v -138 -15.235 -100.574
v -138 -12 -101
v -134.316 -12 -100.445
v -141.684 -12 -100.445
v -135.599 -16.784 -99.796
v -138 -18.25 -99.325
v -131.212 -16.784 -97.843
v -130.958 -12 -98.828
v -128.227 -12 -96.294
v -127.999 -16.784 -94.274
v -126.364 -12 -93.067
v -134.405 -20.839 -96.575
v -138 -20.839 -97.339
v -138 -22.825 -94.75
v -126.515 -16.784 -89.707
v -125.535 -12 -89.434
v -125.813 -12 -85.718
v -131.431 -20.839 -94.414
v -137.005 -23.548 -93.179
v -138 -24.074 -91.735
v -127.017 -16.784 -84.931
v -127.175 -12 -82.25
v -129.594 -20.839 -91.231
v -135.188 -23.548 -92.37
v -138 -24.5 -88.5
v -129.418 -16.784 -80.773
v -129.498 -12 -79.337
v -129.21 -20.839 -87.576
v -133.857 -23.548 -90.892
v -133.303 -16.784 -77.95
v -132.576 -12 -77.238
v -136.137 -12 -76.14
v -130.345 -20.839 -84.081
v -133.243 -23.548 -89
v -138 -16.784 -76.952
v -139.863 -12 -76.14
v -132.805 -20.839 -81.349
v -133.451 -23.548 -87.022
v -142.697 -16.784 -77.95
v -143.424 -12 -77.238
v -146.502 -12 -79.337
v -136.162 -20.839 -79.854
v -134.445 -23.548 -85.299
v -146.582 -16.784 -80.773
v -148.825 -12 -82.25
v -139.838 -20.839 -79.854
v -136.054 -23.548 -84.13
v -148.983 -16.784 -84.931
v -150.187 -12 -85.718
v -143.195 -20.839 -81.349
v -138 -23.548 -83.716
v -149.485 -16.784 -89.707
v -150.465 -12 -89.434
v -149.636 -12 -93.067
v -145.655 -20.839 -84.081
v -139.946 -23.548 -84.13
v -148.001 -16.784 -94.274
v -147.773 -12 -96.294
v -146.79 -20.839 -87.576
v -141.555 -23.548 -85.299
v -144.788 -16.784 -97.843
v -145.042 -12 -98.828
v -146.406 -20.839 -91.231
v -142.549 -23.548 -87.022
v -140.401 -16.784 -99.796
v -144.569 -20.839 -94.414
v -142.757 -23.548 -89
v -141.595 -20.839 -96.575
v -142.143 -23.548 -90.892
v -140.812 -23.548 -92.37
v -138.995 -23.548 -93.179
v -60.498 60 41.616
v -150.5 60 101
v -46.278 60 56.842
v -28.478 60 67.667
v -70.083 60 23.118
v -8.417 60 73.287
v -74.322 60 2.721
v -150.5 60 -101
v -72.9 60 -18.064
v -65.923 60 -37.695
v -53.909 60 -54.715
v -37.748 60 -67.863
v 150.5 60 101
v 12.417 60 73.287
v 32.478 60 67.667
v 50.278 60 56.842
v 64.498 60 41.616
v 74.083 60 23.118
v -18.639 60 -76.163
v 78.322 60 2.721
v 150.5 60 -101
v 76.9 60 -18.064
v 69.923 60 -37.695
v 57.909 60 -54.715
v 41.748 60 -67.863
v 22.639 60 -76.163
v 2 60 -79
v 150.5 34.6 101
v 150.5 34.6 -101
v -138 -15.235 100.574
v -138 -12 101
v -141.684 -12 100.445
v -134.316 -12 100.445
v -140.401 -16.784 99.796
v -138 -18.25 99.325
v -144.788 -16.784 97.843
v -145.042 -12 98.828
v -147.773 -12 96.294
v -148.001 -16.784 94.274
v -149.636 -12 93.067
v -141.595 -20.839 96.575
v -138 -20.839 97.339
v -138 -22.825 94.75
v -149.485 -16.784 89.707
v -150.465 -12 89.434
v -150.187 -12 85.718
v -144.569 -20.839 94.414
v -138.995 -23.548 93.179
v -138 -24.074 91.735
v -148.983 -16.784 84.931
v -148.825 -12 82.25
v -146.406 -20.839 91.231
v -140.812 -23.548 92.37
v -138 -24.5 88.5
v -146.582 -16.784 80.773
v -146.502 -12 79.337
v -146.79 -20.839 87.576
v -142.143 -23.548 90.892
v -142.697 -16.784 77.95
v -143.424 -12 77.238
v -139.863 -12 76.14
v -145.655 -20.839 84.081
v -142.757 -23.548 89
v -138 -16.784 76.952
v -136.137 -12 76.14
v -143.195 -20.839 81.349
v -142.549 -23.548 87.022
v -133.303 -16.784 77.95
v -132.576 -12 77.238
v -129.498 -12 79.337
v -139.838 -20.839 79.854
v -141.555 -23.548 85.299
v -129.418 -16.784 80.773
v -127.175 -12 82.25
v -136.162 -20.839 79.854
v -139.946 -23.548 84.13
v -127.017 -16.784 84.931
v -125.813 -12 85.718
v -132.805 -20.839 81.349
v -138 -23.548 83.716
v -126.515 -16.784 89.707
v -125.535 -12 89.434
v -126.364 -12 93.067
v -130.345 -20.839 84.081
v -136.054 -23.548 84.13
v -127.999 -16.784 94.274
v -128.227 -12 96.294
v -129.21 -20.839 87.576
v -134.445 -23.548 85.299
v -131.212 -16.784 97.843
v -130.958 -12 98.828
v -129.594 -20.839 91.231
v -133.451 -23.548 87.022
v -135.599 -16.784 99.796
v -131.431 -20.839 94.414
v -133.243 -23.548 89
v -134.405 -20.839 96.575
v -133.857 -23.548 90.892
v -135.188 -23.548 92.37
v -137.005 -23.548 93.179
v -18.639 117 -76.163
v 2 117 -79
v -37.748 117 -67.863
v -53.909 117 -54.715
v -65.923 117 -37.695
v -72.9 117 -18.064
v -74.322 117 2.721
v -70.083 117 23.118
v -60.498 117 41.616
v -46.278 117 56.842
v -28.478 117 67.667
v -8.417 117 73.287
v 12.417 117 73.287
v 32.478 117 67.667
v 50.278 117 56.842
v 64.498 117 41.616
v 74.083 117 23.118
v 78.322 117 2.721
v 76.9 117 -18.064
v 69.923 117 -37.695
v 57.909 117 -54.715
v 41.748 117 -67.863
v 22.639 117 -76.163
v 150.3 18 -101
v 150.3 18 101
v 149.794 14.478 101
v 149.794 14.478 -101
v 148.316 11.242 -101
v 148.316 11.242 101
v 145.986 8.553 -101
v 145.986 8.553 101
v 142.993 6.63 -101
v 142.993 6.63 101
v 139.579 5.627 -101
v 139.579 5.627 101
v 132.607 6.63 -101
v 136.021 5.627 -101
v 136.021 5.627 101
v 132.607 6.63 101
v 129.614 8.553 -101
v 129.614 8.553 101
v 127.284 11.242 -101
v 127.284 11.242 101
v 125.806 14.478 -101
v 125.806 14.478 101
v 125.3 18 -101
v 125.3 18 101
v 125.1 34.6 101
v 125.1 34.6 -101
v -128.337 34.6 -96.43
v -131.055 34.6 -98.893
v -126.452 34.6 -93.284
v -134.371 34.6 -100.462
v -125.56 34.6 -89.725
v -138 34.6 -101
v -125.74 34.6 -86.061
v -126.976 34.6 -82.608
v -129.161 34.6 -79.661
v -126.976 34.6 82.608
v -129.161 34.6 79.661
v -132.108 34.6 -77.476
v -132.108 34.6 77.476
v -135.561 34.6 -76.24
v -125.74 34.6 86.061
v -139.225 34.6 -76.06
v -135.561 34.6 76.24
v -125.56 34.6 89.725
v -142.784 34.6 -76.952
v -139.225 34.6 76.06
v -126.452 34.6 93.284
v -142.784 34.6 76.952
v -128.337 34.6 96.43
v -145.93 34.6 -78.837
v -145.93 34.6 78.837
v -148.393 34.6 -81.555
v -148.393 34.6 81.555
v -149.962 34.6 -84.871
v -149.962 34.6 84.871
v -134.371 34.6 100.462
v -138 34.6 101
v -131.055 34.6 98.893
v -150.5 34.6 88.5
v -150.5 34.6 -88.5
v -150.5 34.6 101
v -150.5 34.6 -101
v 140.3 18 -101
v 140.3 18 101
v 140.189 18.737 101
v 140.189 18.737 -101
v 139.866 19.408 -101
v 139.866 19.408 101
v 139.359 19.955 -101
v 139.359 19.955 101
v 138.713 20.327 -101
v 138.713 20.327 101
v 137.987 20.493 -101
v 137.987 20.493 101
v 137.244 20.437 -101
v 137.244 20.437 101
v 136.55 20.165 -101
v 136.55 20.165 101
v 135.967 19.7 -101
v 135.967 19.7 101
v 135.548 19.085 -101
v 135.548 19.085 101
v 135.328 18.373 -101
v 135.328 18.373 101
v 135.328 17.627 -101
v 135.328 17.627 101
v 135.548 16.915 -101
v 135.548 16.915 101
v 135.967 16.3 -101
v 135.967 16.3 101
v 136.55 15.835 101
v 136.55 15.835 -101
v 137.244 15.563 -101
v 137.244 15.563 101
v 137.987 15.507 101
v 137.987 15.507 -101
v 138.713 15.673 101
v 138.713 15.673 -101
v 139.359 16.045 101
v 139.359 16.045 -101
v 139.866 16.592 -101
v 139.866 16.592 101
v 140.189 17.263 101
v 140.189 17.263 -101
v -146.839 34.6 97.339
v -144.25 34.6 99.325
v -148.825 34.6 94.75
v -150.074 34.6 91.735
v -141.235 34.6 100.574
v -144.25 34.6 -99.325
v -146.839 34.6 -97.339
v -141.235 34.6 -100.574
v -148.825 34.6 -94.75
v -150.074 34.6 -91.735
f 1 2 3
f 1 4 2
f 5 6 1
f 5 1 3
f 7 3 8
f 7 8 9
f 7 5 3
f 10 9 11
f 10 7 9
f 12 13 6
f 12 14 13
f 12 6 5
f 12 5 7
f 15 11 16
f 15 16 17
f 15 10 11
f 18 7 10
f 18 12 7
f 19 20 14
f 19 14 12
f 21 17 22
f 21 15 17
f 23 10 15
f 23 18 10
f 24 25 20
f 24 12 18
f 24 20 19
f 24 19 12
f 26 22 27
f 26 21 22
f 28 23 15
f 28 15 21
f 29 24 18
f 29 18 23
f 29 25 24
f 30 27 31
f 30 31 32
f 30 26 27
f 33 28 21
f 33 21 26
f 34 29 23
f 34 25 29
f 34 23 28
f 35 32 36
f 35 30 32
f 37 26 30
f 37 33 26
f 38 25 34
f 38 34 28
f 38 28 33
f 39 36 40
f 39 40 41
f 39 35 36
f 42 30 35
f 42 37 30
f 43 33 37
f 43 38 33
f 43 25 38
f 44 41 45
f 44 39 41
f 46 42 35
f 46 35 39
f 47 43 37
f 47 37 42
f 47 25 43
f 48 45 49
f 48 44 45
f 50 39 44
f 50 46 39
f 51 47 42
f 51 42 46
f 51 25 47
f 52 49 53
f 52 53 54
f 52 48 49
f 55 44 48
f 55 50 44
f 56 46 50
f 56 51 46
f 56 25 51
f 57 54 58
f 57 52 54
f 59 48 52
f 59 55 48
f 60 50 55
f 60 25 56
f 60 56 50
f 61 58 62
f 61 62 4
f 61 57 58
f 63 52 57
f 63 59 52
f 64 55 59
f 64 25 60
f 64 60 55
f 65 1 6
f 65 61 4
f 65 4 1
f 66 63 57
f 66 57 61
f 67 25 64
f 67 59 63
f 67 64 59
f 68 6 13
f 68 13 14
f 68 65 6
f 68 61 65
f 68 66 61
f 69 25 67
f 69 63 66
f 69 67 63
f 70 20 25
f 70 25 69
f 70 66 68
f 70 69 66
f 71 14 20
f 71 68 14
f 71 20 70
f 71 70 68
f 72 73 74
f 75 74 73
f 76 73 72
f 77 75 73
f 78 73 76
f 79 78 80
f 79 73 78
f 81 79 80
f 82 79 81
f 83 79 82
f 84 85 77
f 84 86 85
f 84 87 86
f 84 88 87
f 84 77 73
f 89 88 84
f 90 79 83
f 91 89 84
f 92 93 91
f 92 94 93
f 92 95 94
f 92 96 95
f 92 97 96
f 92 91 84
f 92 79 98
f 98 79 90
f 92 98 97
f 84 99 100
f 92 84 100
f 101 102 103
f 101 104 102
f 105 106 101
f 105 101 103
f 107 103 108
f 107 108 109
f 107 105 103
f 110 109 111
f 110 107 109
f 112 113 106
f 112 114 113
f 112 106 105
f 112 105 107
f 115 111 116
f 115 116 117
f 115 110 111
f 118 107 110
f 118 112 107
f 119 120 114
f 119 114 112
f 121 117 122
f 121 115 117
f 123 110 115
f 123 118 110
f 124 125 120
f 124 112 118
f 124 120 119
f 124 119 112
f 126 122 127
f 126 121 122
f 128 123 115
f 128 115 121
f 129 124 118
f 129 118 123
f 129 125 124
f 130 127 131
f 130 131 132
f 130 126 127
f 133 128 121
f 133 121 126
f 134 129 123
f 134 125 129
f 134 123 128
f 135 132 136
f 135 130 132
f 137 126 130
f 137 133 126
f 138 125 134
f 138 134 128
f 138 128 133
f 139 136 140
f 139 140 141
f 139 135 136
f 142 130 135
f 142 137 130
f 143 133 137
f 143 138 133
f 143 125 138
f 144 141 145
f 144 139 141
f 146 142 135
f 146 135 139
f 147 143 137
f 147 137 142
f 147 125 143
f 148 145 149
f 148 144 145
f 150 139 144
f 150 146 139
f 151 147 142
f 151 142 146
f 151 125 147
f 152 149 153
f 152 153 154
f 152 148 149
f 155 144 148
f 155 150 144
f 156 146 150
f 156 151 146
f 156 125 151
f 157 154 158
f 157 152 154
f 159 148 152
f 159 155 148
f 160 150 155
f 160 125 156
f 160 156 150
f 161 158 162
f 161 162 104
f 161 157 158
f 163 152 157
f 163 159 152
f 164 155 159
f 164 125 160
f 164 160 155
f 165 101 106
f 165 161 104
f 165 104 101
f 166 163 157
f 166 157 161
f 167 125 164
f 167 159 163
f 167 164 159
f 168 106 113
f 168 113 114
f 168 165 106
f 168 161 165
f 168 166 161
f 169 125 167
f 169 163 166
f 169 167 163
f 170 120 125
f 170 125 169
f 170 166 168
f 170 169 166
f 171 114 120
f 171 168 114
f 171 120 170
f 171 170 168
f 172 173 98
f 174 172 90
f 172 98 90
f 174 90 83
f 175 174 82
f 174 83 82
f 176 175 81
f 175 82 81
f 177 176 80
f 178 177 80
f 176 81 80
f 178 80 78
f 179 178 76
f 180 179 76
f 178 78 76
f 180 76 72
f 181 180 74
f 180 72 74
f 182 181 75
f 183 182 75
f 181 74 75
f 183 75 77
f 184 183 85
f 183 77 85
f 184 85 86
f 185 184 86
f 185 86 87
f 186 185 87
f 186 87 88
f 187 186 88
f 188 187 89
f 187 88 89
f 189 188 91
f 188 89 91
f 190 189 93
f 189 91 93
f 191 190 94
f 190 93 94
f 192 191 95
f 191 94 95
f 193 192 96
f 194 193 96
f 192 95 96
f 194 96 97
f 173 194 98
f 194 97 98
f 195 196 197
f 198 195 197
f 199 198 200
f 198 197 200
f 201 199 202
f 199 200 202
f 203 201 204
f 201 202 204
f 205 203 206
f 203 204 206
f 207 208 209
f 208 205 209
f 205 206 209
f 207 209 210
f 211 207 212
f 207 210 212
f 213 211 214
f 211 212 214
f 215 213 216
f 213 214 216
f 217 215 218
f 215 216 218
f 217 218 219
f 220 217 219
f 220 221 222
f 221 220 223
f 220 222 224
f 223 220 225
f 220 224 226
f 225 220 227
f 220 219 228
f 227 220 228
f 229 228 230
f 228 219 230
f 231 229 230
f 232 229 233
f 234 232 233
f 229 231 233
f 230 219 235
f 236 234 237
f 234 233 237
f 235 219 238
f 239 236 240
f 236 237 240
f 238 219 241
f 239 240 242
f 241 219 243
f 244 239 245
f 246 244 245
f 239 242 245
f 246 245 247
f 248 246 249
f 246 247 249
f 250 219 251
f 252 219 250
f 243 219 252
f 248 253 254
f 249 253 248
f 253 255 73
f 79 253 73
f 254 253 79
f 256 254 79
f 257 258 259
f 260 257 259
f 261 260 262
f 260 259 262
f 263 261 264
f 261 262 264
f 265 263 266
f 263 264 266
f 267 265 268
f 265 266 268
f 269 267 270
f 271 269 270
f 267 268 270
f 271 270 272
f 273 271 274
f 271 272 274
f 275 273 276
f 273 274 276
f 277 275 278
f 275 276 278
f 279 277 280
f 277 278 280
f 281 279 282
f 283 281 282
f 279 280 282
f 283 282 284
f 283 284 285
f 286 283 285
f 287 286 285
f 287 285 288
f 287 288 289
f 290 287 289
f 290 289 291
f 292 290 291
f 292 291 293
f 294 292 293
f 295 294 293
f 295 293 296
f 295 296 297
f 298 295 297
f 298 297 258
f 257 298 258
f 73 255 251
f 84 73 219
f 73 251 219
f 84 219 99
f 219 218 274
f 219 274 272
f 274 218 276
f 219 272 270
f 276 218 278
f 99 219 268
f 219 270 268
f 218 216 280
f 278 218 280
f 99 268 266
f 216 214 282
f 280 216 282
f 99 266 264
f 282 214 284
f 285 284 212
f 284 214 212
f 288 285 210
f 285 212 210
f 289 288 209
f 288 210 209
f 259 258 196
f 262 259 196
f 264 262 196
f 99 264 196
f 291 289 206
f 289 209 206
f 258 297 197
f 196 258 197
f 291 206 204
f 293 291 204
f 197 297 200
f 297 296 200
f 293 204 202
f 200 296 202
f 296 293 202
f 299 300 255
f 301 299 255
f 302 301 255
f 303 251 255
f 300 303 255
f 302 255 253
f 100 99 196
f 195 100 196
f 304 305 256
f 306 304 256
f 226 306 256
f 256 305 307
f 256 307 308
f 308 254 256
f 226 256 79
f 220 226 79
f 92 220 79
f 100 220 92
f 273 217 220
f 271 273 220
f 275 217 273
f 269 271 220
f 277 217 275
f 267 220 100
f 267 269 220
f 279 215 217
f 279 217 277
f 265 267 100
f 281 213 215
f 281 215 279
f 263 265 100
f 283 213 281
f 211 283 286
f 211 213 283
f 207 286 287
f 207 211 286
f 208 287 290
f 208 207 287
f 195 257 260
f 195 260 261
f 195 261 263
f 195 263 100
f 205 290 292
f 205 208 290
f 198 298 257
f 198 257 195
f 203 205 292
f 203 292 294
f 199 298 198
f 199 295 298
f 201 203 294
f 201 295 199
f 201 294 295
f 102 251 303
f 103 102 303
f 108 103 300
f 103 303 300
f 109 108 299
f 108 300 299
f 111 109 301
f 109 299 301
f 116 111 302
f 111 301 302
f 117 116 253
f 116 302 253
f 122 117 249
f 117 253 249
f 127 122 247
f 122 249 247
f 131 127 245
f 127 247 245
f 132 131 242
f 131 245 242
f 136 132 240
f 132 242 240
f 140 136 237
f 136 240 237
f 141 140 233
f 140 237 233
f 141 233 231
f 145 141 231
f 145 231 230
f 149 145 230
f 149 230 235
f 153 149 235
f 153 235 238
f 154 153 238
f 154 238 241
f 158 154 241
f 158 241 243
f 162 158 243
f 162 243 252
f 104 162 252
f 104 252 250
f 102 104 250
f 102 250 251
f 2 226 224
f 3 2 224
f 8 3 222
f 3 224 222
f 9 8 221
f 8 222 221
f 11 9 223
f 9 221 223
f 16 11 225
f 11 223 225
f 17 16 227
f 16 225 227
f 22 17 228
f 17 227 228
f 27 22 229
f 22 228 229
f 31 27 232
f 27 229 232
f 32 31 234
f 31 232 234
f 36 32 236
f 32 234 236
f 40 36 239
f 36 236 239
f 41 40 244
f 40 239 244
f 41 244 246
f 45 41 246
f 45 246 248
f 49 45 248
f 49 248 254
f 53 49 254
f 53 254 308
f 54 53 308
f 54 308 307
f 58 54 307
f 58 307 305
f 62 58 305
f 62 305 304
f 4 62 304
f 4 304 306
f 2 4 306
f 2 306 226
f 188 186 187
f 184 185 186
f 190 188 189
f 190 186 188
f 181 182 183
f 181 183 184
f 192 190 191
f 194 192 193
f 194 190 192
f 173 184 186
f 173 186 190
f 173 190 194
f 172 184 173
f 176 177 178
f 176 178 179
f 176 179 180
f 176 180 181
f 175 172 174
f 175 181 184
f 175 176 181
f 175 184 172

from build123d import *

# Parameters (mm, degrees)
SKETCH1_W           = 301
SKETCH1_H           = 202
BOSS_EXTRUDE1_DEPTH = 60
CUT_EXTRUDE1_DEPTH  = 259.948353924
SKETCH5_R           = 12.5
BOSS_EXTRUDE2_DEPTH = 59.1
FILLET1_R           = 12.5
SKETCH2_R           = 2.5
CUT_EXTRUDE2_DEPTH  = 259.948353924
SKETCH6_R           = 76.5
BOSS_EXTRUDE3_DEPTH = 57


with BuildPart() as part:
    # Sketch1 → Boss-Extrude1 (new body)
    with BuildSketch(Plane(origin=(0, 0, 0), x_dir=(1, 0, 0), z_dir=(0, 1, 0))):
        Rectangle(SKETCH1_W, SKETCH1_H)
    extrude(amount=BOSS_EXTRUDE1_DEPTH)

    # Sketch4 → Cut-Extrude1 (cut, through all)
    with BuildSketch(Plane.XY.offset(101)):
        with BuildLine():
            Line((125.3, 18), (125.1, 34.6))
            Line((125.1, 34.6), (-150.5, 34.6))
            Line((-150.5, 34.6), (-150.5, 0))
            Line((-150.5, 0), (150.5, 0))
            Line((150.5, 0), (150.5, 34.6))
            Line((150.5, 34.6), (150.3, 18))
            ThreePointArc((150.3, 18), (137.8, 5.5), (125.3, 18))
        make_face()
    extrude(amount=-CUT_EXTRUDE1_DEPTH, mode=Mode.SUBTRACT)

    # Sketch5 → Boss-Extrude2 (add)
    with BuildSketch(Plane.XZ.offset(-34.6)):
        with Locations(Location((-138, 88.5, 0), (0, 0, 90))):
            Circle(SKETCH5_R)
        with Locations(Location((-138, -88.5, 0), (0, 0, 270))):
            Circle(SKETCH5_R)
    extrude(amount=BOSS_EXTRUDE2_DEPTH)

    # Fillet1
    fillet1_edges = [part.edges().sort_by_distance(p)[0] for p in [
        (-138, -24.5, 76),
        (-138, -24.5, -76),
    ]]
    fillet(fillet1_edges, radius=FILLET1_R)

    # Sketch2 → Cut-Extrude2 (cut, through all)
    with BuildSketch(Plane.XY.offset(101)):
        with Locations((137.8, 18)):
            Circle(SKETCH2_R)
    extrude(amount=-CUT_EXTRUDE2_DEPTH, mode=Mode.SUBTRACT)

    # Sketch6 → Boss-Extrude3 (add)
    with BuildSketch(Plane(origin=(0, 60, 0), x_dir=(1, 0, 0), z_dir=(0, 1, 0))):
        with Locations(Location((2, 2.5, 0), (0, 0, 90))):
            Circle(SKETCH6_R)
    extrude(amount=BOSS_EXTRUDE3_DEPTH)


solid = part.part
